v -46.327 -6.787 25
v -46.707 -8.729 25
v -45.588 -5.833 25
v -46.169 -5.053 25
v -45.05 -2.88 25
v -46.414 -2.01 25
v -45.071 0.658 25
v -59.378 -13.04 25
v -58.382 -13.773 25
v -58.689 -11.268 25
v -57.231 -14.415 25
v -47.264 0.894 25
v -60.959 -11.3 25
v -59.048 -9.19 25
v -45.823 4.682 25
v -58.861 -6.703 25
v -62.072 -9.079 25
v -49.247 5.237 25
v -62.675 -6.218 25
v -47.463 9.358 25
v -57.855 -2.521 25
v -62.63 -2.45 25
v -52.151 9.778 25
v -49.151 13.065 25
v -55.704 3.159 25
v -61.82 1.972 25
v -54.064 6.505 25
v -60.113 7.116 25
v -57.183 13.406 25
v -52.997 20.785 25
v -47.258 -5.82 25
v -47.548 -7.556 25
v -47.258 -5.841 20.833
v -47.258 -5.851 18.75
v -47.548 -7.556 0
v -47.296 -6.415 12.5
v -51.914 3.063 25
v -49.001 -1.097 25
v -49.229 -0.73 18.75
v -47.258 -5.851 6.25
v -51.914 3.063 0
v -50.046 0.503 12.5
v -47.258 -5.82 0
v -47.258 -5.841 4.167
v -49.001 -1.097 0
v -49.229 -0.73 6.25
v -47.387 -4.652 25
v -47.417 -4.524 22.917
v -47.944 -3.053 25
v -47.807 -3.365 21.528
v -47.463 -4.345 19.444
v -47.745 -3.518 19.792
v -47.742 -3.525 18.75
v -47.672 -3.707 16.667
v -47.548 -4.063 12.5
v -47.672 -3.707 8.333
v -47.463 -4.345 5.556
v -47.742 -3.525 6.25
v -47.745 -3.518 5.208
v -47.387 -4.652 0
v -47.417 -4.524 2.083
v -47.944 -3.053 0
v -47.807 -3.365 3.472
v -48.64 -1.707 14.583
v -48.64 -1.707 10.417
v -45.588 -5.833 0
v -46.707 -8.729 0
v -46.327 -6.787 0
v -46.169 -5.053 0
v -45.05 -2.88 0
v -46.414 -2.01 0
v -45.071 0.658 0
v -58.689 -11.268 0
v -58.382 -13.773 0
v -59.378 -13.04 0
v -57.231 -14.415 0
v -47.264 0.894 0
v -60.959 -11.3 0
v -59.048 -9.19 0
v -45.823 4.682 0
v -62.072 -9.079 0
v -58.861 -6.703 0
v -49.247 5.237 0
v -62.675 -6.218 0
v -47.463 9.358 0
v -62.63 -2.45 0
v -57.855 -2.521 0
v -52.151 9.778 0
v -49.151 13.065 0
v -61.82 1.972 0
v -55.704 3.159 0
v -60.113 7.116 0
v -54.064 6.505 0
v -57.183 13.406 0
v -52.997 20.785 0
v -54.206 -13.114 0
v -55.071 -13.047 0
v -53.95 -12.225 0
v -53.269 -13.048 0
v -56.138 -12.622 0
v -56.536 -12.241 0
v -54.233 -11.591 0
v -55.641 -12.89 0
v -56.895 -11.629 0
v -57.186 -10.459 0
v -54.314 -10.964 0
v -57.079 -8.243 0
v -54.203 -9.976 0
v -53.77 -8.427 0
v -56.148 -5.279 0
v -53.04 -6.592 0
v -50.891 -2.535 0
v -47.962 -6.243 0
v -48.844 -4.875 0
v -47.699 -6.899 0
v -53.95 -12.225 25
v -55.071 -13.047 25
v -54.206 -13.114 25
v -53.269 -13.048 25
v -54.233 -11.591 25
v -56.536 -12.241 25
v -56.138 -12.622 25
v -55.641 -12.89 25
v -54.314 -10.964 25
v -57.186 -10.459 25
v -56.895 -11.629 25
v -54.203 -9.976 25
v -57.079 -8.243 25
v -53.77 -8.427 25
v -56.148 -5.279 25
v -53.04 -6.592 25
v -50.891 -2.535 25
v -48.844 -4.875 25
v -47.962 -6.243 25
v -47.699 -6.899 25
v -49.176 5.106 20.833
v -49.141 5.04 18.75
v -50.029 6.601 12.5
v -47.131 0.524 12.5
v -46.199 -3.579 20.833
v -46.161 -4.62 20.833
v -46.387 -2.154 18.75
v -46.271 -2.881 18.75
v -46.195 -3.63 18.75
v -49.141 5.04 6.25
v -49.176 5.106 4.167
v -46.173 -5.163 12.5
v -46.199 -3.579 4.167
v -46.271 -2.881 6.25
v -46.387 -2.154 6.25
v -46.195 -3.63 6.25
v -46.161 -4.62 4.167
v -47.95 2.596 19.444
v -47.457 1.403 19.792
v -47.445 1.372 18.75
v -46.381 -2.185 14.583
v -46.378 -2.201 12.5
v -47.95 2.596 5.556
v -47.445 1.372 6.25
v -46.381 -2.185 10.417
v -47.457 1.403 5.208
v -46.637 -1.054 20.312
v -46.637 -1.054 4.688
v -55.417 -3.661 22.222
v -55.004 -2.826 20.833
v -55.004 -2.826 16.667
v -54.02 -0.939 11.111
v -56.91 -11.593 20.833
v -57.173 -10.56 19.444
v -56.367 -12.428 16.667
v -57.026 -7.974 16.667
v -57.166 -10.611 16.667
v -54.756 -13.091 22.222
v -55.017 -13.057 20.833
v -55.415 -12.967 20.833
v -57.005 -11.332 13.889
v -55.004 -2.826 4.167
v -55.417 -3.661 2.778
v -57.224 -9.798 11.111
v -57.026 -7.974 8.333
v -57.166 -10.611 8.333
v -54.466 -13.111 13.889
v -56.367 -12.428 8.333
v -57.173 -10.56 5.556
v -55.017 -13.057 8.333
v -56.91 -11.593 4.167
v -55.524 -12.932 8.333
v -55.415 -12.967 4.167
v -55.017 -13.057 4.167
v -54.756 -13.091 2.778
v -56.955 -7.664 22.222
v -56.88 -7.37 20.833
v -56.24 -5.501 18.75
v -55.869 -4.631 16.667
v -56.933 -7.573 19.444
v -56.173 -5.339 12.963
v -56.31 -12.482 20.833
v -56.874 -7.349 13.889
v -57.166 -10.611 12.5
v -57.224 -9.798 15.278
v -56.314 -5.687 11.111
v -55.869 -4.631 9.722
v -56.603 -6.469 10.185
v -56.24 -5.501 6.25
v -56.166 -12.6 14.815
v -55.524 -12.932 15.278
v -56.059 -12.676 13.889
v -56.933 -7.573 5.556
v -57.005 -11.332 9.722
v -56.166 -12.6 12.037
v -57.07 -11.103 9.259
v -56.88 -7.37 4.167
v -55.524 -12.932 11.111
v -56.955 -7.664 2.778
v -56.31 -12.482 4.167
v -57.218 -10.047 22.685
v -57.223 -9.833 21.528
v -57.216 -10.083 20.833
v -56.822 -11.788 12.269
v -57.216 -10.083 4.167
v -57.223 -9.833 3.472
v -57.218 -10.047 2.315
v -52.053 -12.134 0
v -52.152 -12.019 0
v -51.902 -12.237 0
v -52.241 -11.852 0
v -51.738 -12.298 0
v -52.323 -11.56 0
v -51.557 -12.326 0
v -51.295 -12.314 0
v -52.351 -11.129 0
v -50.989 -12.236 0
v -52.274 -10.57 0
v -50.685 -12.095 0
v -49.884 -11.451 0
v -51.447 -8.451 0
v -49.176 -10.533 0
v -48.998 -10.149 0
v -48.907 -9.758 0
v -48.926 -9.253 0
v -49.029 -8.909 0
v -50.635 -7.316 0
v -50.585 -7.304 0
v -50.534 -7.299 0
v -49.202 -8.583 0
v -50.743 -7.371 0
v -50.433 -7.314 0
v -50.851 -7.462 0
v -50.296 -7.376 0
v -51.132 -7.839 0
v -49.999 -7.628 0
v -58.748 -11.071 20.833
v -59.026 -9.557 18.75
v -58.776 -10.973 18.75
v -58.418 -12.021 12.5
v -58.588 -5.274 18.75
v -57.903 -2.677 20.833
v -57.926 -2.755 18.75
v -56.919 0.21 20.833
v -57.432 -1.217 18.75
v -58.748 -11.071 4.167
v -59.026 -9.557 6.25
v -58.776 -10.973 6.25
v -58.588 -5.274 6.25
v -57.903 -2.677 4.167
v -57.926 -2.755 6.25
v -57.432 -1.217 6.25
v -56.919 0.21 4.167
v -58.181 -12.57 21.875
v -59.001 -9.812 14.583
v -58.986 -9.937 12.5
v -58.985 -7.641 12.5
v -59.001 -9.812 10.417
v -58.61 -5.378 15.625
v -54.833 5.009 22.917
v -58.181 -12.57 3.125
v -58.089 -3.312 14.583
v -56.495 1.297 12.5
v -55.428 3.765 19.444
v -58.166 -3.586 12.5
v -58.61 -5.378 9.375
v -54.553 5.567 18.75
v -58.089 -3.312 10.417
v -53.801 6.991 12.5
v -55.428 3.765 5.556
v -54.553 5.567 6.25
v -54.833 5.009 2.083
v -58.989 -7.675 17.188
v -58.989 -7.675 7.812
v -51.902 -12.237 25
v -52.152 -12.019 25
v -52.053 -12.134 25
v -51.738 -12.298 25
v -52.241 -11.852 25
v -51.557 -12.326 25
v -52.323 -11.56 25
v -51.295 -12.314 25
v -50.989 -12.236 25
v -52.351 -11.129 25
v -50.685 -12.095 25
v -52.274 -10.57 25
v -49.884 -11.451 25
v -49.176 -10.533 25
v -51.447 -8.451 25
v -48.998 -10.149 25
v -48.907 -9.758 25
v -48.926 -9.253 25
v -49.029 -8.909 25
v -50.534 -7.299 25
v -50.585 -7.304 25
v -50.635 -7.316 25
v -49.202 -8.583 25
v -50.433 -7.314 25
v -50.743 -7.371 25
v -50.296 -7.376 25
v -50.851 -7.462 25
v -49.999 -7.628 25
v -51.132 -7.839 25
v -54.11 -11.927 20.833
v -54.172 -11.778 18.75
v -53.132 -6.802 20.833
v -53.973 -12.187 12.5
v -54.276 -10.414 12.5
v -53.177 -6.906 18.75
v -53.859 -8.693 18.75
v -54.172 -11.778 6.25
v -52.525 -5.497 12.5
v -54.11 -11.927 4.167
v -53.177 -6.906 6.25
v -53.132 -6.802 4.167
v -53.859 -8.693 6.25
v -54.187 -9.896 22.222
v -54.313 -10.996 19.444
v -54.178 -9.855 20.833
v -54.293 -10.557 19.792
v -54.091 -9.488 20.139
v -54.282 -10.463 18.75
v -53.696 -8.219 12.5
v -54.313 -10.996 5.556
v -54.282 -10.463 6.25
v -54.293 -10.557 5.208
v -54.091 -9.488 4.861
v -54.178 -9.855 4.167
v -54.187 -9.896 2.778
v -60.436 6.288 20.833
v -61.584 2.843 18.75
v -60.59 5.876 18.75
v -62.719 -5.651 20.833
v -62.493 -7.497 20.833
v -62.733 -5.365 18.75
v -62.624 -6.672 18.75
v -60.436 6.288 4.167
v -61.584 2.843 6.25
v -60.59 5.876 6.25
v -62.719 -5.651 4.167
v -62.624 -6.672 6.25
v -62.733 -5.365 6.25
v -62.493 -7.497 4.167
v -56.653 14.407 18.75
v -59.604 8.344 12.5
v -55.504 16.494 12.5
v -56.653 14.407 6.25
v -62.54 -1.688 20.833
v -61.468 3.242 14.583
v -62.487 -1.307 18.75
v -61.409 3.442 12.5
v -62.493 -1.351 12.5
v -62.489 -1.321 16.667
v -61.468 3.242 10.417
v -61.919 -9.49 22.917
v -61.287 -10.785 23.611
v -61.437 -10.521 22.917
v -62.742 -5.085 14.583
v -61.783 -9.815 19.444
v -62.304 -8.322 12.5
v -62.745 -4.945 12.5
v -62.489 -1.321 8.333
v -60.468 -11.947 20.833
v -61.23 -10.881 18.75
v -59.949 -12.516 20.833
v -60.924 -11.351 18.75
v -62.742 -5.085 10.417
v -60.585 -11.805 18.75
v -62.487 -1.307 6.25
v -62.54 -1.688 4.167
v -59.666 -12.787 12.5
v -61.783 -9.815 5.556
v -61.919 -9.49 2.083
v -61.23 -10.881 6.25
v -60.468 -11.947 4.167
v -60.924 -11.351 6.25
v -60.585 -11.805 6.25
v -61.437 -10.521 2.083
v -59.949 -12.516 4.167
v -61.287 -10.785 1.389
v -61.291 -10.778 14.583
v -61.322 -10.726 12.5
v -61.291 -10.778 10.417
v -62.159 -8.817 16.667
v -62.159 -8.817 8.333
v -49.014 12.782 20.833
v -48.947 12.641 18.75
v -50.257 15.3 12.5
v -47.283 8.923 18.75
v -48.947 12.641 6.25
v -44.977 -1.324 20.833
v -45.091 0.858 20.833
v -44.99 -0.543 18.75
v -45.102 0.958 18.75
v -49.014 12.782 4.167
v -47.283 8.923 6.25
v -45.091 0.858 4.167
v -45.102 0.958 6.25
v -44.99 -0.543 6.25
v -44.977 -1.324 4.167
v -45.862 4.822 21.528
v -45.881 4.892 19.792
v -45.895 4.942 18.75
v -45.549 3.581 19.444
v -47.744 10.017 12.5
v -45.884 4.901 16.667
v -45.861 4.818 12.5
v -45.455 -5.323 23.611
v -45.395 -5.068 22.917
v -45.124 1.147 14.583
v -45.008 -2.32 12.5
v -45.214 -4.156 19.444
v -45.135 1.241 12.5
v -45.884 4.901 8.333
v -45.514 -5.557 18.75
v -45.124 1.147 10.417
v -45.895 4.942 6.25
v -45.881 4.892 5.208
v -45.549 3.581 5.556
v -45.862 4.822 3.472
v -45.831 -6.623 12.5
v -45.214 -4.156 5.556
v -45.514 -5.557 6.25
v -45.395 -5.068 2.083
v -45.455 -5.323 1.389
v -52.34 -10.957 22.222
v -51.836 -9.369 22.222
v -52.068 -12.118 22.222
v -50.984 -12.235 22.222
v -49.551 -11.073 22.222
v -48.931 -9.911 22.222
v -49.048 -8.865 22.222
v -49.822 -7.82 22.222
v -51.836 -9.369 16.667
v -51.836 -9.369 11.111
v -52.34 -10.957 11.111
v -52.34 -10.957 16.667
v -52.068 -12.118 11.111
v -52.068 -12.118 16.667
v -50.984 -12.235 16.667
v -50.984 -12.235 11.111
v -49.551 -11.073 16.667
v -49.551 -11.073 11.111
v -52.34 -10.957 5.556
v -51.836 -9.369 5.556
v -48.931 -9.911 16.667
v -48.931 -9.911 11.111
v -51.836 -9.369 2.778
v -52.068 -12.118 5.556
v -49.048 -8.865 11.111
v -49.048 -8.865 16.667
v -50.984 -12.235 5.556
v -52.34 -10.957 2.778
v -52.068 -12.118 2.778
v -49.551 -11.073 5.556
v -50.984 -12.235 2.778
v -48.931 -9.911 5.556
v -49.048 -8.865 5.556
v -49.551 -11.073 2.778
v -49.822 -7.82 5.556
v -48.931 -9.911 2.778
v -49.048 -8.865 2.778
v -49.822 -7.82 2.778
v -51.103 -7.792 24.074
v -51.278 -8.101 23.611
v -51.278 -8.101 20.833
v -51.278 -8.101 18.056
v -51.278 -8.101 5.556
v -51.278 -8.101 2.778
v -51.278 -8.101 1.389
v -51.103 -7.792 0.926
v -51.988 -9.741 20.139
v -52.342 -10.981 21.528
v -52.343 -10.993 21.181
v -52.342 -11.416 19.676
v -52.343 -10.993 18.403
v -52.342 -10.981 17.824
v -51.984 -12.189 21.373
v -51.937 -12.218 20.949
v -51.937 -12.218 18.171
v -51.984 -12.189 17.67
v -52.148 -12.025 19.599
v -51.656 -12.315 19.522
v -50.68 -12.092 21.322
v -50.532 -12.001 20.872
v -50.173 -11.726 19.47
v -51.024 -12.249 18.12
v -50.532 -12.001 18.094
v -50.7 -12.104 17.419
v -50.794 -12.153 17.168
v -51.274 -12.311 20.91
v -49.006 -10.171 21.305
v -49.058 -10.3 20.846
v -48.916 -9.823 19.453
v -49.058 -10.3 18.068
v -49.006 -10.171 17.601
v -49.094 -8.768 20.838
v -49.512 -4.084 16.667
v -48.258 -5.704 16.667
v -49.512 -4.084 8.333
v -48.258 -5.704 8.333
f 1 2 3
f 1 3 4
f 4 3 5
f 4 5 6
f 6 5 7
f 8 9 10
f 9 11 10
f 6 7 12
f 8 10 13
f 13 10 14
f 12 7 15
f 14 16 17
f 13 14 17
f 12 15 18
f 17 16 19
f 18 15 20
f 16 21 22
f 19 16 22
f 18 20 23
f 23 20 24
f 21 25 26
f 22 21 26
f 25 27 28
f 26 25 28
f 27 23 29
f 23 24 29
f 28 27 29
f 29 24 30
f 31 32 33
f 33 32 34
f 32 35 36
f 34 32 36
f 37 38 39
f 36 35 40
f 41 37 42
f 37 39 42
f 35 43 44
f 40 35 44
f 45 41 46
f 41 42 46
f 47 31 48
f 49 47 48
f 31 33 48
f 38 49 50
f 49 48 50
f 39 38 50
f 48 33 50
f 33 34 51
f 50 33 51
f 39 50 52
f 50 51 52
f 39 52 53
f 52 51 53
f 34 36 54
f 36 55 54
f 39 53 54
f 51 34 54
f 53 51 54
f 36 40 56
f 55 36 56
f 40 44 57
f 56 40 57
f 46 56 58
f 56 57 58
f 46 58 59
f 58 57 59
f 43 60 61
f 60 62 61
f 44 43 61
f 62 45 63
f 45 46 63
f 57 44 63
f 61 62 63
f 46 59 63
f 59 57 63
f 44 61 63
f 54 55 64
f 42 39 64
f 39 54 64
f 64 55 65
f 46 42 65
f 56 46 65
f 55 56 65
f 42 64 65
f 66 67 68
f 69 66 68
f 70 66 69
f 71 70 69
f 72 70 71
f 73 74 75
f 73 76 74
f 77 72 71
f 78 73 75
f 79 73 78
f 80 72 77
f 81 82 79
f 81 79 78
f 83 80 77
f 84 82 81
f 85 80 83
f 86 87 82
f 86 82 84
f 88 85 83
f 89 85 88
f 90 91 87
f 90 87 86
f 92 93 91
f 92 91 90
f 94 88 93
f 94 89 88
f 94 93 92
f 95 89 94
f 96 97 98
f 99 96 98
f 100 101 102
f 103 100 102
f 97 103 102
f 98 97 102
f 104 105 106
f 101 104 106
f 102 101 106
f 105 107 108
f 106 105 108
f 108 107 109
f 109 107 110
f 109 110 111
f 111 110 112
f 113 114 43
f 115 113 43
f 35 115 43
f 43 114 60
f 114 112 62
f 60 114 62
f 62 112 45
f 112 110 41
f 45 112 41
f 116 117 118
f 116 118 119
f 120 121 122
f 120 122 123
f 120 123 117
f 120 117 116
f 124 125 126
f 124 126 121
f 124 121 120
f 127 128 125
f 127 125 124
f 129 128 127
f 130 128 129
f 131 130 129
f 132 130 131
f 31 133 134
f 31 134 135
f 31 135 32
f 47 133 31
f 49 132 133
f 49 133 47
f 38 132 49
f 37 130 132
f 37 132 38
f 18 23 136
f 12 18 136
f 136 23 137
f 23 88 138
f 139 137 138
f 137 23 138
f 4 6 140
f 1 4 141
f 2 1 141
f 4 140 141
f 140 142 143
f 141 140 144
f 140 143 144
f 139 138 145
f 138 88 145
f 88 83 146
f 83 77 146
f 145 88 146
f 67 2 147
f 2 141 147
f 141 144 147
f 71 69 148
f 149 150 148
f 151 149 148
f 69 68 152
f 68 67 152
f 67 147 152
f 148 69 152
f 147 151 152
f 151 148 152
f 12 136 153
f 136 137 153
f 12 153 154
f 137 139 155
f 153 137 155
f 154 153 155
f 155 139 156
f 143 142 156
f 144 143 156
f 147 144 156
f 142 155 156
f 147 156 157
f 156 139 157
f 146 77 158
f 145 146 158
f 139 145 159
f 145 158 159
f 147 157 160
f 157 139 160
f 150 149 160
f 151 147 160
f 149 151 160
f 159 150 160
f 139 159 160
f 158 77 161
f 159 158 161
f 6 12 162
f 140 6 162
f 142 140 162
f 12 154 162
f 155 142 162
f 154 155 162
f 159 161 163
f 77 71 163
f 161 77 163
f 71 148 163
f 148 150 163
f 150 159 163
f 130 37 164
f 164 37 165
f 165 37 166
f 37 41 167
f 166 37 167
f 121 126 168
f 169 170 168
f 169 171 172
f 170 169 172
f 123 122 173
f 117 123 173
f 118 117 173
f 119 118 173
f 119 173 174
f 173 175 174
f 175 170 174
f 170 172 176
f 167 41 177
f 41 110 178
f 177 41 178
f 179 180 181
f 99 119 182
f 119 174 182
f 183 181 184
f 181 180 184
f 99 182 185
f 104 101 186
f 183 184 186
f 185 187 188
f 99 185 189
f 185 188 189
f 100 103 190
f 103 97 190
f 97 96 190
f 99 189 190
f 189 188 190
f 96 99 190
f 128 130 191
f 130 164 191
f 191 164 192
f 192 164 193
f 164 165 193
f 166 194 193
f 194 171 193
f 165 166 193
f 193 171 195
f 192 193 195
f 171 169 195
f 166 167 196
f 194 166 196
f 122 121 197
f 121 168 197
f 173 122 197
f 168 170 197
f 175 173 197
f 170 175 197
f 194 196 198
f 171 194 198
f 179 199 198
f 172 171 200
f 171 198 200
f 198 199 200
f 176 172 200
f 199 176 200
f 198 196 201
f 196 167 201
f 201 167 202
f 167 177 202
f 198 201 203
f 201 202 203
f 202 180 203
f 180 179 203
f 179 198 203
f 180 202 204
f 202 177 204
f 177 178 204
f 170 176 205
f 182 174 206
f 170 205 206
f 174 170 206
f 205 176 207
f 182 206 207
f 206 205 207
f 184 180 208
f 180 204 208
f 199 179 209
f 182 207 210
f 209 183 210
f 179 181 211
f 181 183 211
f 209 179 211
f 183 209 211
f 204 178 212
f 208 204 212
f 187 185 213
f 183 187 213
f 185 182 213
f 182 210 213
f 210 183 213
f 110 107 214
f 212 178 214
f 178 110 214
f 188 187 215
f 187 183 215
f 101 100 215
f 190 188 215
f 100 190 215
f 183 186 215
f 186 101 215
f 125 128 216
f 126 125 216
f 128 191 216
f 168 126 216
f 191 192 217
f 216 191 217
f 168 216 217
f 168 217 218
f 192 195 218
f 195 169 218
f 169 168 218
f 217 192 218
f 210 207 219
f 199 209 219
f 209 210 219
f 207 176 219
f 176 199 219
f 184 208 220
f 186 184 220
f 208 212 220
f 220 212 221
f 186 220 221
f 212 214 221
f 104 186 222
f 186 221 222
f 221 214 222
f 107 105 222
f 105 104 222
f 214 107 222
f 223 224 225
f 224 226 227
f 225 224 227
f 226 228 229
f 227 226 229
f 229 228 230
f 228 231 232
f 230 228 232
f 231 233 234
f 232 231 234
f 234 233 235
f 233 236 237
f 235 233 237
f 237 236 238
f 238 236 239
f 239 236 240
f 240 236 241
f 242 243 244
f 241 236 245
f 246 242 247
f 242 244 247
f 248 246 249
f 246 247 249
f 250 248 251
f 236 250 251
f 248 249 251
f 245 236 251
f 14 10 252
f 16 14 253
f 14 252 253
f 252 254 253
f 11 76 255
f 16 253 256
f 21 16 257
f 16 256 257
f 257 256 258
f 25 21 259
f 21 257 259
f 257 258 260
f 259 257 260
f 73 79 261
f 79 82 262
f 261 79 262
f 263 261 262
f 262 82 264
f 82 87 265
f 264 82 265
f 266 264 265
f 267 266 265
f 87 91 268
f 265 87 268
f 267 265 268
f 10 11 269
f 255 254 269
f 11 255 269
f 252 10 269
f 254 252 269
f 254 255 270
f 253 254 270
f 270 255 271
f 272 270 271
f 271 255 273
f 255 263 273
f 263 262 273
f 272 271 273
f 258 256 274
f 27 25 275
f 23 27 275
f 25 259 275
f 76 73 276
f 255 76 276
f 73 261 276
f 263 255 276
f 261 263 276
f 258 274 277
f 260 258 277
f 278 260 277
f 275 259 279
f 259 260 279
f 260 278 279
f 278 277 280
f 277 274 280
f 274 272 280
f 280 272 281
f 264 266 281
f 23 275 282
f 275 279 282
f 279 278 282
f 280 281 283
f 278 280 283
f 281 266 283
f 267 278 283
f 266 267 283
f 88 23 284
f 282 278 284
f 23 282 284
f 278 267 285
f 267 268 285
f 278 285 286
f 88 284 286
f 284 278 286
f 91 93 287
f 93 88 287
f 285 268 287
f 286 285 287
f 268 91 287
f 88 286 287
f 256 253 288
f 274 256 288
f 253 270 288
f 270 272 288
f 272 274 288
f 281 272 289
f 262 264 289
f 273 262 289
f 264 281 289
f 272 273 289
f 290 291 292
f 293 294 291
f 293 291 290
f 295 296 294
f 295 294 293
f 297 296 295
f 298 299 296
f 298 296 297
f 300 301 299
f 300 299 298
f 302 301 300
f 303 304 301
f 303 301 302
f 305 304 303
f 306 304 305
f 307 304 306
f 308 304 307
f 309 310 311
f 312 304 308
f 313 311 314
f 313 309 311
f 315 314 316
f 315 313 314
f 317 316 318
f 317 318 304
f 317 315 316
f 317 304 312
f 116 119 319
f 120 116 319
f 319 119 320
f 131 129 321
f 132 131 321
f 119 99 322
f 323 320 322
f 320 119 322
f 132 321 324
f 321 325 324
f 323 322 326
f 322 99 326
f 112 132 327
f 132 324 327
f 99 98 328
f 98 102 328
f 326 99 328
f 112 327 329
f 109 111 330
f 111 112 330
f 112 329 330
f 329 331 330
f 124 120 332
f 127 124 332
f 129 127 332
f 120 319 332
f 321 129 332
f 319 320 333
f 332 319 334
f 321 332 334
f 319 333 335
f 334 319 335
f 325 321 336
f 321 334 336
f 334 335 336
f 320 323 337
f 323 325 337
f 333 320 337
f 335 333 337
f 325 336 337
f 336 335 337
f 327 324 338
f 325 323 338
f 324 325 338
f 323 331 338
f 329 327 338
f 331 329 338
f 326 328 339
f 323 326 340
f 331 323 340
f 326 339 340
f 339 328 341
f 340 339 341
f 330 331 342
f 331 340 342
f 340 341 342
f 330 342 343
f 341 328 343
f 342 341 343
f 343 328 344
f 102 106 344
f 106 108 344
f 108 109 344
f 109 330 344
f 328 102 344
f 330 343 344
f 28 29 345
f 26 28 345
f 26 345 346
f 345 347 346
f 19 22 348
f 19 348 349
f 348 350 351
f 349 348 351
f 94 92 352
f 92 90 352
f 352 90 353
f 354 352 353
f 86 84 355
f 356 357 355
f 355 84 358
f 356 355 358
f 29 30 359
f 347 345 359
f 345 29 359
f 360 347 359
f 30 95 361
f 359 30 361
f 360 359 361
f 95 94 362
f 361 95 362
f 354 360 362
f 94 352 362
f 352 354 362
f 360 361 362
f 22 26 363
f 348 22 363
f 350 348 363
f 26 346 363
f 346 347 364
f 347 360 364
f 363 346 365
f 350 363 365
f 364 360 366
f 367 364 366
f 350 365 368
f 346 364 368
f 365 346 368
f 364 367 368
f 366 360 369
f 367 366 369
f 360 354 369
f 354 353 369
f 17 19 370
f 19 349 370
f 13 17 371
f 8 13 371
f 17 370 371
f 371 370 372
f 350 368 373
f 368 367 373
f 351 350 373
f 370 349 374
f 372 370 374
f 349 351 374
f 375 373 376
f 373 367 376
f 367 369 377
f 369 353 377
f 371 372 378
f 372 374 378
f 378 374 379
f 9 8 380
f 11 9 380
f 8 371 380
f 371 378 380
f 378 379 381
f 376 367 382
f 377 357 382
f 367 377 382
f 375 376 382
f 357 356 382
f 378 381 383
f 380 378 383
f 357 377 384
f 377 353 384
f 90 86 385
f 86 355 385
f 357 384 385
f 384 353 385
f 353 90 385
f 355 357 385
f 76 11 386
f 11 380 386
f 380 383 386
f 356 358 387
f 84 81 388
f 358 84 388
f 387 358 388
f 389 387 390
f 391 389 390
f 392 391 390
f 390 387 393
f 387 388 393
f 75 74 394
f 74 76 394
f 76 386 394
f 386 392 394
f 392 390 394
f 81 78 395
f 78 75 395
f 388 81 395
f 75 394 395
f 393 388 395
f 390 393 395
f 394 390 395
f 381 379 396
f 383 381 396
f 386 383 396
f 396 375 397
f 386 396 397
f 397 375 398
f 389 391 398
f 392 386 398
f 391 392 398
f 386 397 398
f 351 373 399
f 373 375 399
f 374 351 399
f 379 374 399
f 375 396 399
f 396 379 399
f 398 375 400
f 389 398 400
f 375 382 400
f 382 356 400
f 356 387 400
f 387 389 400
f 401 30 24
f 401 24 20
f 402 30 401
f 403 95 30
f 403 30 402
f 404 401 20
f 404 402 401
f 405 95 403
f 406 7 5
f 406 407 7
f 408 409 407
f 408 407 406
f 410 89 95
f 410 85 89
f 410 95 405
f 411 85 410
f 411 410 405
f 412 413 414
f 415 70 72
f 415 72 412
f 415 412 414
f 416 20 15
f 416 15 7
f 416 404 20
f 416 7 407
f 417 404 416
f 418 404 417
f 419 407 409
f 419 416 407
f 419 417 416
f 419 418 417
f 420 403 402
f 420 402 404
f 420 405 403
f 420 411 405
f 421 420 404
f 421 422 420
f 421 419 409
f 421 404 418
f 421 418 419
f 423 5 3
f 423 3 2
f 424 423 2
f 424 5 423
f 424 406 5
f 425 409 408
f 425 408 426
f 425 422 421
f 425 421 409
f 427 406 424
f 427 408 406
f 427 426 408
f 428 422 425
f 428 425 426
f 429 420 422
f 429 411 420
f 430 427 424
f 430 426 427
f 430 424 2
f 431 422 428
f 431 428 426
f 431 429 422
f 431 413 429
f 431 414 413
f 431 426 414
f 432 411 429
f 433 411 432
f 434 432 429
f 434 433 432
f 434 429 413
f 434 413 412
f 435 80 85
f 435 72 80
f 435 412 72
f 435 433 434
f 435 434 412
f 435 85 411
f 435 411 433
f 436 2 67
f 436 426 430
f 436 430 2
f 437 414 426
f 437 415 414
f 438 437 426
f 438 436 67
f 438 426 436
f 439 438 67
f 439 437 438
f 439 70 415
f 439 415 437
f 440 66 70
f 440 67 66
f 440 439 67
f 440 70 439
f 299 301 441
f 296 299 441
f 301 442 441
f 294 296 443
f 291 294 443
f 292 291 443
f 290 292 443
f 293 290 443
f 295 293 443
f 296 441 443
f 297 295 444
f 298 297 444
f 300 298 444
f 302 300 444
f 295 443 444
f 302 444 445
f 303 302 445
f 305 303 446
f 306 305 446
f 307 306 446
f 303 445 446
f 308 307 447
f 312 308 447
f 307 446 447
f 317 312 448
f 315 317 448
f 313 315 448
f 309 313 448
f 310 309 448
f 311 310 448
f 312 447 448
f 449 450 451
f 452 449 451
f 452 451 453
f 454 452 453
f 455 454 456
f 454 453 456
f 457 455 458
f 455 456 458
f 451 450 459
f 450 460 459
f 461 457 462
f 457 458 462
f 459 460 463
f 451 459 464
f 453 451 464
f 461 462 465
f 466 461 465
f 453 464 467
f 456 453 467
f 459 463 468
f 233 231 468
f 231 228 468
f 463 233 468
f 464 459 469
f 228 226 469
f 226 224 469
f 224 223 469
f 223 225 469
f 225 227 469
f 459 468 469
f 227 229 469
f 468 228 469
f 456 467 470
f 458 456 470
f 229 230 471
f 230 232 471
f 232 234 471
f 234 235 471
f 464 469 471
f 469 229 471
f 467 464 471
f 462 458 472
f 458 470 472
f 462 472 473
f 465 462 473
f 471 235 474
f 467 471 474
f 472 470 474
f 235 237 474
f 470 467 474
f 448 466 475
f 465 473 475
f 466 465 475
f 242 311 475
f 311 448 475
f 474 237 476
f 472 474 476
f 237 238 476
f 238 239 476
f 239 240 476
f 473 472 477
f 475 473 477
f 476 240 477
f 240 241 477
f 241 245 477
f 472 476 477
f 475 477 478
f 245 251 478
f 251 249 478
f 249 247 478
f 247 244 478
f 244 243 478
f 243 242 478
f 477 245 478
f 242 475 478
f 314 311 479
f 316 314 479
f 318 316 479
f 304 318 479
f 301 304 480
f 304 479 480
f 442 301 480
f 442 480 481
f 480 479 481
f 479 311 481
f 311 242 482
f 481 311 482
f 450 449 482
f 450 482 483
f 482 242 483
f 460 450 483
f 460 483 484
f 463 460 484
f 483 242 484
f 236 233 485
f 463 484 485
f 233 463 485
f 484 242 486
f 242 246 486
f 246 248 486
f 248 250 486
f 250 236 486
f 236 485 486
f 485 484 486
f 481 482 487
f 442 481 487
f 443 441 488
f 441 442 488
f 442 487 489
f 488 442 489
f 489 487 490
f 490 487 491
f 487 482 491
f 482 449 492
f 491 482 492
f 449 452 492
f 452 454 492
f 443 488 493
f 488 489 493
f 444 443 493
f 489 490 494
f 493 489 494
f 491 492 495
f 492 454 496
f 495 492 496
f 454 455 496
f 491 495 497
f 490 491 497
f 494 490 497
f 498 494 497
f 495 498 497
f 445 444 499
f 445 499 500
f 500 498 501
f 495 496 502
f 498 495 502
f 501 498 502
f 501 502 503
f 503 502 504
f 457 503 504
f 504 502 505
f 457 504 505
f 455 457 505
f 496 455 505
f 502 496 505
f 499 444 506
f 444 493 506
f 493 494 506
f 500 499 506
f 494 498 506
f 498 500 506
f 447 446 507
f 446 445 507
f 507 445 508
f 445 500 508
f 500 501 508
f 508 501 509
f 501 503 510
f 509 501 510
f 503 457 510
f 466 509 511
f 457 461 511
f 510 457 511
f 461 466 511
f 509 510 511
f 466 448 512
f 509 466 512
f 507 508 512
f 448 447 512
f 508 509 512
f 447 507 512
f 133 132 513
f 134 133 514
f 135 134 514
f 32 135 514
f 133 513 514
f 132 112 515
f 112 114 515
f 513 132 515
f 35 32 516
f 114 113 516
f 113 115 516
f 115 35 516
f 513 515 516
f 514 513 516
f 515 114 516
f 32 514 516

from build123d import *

# Parameters (mm, degrees)
F1_DEPTH = 25


with BuildPart() as f1:
    # F0 (on Top) → F1 (new body)
    with BuildSketch(Plane.XY):
        with BuildLine():
            add(Edge.make_bspline(
                [(-52.9974363744, 20.7852516323), (-50.2757951617, 15.1605252177), (-44.6710266869, 5.4800907667), (-44.5301085711, -4.3748170137), (-46.7074215412, -8.7294438854)],
                knots=[0, 0, 0, 0, 0.5316356339, 1, 1, 1, 1], degree=3))
            add(Edge.make_bspline(
                [(-52.9974363744, 20.7852516323), (-57.8359141946, 12.7412881702), (-64.2734760638, 0.1426304806), (-62.4929443002, -11.8744531646), (-57.2311021388, -14.4146522507)],
                knots=[0, 0, 0, 0, 0.566680098, 1, 1, 1, 1], degree=3))
            add(Edge.make_bspline(
                [(-57.2311021388, -14.4146522507), (-58.7431266904, -11.6930101067), (-60.0889979899, -7.8041864407), (-56.0214854777, 3.7296281662), (-52.1507039666, 9.7777219489)],
                knots=[0, 0, 0, 0, 0.3794684857, 1, 1, 1, 1], degree=3))
            add(Edge.make_bspline(
                [(-52.1507039666, 9.7777219489), (-49.7919470072, 6.5722325817), (-46.6241297533, 0.4921891647), (-45.7397252321, -4.737702664), (-46.7074215412, -8.7294438854)],
                knots=[0, 0, 0, 0, 0.5159864443, 1, 1, 1, 1], degree=3))
        make_face()
    extrude(amount=F1_DEPTH)


with BuildPart() as f1b:
    # F0 (on Top) → F1, piece 2 (new body)
    with BuildSketch(Plane.XY):
        with BuildLine():
            add(Edge.make_bspline(
                [(-51.9135557115, 3.0633846764), (-54.0049374104, -1.0806486243), (-57.7902565815, -7.0924224922), (-57.0311146226, -13.0273550866), (-54.5084178448, -13.2029149681), (-53.2690808177, -13.0479978397)],
                knots=[0, 0, 0, 0, 0.4721353842, 0.7593717025, 1, 1, 1, 1], degree=3))
            add(Edge.make_bspline(
                [(-53.2690808177, -13.0479978397), (-54.1965989754, -12.1204778234), (-54.7932720181, -10.3296628525), (-52.7135841684, -5.5210231409), (-50.8910765232, -2.5352080762)],
                knots=[0, 0, 0, 0, 0.3644339441, 1, 1, 1, 1], degree=3))
            add(Edge.make_bspline(
                [(-50.8910765232, -2.5352080762), (-49.5897966127, -4.1015329771), (-47.8469803929, -5.5345166475), (-47.5477080203, -7.5556505553)],
                knots=[0, 0, 0, 0, 6.031828548, 6.031828548, 6.031828548, 6.031828548], degree=3))
            add(Edge.make_bspline(
                [(-47.5477080203, -7.5556505553), (-47.1885837615, -6.3865608536), (-47.0526977479, -3.7302992847), (-49.9383620918, 0.4685227177), (-51.9135557115, 3.0633846764)],
                knots=[0, 0, 0, 0, 0.3926457033, 1, 1, 1, 1], degree=3))
        make_face()
    extrude(amount=F1_DEPTH)


with BuildPart() as f1c:
    # F0 (on Top) → F1, piece 3 (new body)
    with BuildSketch(Plane.XY):
        with BuildLine():
            add(Edge.make_bspline(
                [(-50.6354905665, -7.3160640895), (-51.0702673118, -7.4605337174), (-51.8848310248, -9.5199897206), (-52.4476000215, -10.811651993), (-52.269940426, -12.3301767035), (-50.8434040716, -12.4208133574), (-49.4921841528, -11.1208995159), (-48.8152250169, -9.9672150807), (-48.9430635904, -8.7943150649), (-49.7699038433, -7.8770136828), (-50.3597416266, -7.2244369564), (-50.6354905665, -7.3160640895)],
                knots=[0, 0, 0, 0, 0.145209616, 0.2667451253, 0.3696004116, 0.4679400624, 0.5958395023, 0.7038956714, 0.8004839263, 0.9079035434, 1, 1, 1, 1], degree=3))
        make_face()
    extrude(amount=F1_DEPTH)


solid = Compound([f1.part, f1b.part, f1c.part])
